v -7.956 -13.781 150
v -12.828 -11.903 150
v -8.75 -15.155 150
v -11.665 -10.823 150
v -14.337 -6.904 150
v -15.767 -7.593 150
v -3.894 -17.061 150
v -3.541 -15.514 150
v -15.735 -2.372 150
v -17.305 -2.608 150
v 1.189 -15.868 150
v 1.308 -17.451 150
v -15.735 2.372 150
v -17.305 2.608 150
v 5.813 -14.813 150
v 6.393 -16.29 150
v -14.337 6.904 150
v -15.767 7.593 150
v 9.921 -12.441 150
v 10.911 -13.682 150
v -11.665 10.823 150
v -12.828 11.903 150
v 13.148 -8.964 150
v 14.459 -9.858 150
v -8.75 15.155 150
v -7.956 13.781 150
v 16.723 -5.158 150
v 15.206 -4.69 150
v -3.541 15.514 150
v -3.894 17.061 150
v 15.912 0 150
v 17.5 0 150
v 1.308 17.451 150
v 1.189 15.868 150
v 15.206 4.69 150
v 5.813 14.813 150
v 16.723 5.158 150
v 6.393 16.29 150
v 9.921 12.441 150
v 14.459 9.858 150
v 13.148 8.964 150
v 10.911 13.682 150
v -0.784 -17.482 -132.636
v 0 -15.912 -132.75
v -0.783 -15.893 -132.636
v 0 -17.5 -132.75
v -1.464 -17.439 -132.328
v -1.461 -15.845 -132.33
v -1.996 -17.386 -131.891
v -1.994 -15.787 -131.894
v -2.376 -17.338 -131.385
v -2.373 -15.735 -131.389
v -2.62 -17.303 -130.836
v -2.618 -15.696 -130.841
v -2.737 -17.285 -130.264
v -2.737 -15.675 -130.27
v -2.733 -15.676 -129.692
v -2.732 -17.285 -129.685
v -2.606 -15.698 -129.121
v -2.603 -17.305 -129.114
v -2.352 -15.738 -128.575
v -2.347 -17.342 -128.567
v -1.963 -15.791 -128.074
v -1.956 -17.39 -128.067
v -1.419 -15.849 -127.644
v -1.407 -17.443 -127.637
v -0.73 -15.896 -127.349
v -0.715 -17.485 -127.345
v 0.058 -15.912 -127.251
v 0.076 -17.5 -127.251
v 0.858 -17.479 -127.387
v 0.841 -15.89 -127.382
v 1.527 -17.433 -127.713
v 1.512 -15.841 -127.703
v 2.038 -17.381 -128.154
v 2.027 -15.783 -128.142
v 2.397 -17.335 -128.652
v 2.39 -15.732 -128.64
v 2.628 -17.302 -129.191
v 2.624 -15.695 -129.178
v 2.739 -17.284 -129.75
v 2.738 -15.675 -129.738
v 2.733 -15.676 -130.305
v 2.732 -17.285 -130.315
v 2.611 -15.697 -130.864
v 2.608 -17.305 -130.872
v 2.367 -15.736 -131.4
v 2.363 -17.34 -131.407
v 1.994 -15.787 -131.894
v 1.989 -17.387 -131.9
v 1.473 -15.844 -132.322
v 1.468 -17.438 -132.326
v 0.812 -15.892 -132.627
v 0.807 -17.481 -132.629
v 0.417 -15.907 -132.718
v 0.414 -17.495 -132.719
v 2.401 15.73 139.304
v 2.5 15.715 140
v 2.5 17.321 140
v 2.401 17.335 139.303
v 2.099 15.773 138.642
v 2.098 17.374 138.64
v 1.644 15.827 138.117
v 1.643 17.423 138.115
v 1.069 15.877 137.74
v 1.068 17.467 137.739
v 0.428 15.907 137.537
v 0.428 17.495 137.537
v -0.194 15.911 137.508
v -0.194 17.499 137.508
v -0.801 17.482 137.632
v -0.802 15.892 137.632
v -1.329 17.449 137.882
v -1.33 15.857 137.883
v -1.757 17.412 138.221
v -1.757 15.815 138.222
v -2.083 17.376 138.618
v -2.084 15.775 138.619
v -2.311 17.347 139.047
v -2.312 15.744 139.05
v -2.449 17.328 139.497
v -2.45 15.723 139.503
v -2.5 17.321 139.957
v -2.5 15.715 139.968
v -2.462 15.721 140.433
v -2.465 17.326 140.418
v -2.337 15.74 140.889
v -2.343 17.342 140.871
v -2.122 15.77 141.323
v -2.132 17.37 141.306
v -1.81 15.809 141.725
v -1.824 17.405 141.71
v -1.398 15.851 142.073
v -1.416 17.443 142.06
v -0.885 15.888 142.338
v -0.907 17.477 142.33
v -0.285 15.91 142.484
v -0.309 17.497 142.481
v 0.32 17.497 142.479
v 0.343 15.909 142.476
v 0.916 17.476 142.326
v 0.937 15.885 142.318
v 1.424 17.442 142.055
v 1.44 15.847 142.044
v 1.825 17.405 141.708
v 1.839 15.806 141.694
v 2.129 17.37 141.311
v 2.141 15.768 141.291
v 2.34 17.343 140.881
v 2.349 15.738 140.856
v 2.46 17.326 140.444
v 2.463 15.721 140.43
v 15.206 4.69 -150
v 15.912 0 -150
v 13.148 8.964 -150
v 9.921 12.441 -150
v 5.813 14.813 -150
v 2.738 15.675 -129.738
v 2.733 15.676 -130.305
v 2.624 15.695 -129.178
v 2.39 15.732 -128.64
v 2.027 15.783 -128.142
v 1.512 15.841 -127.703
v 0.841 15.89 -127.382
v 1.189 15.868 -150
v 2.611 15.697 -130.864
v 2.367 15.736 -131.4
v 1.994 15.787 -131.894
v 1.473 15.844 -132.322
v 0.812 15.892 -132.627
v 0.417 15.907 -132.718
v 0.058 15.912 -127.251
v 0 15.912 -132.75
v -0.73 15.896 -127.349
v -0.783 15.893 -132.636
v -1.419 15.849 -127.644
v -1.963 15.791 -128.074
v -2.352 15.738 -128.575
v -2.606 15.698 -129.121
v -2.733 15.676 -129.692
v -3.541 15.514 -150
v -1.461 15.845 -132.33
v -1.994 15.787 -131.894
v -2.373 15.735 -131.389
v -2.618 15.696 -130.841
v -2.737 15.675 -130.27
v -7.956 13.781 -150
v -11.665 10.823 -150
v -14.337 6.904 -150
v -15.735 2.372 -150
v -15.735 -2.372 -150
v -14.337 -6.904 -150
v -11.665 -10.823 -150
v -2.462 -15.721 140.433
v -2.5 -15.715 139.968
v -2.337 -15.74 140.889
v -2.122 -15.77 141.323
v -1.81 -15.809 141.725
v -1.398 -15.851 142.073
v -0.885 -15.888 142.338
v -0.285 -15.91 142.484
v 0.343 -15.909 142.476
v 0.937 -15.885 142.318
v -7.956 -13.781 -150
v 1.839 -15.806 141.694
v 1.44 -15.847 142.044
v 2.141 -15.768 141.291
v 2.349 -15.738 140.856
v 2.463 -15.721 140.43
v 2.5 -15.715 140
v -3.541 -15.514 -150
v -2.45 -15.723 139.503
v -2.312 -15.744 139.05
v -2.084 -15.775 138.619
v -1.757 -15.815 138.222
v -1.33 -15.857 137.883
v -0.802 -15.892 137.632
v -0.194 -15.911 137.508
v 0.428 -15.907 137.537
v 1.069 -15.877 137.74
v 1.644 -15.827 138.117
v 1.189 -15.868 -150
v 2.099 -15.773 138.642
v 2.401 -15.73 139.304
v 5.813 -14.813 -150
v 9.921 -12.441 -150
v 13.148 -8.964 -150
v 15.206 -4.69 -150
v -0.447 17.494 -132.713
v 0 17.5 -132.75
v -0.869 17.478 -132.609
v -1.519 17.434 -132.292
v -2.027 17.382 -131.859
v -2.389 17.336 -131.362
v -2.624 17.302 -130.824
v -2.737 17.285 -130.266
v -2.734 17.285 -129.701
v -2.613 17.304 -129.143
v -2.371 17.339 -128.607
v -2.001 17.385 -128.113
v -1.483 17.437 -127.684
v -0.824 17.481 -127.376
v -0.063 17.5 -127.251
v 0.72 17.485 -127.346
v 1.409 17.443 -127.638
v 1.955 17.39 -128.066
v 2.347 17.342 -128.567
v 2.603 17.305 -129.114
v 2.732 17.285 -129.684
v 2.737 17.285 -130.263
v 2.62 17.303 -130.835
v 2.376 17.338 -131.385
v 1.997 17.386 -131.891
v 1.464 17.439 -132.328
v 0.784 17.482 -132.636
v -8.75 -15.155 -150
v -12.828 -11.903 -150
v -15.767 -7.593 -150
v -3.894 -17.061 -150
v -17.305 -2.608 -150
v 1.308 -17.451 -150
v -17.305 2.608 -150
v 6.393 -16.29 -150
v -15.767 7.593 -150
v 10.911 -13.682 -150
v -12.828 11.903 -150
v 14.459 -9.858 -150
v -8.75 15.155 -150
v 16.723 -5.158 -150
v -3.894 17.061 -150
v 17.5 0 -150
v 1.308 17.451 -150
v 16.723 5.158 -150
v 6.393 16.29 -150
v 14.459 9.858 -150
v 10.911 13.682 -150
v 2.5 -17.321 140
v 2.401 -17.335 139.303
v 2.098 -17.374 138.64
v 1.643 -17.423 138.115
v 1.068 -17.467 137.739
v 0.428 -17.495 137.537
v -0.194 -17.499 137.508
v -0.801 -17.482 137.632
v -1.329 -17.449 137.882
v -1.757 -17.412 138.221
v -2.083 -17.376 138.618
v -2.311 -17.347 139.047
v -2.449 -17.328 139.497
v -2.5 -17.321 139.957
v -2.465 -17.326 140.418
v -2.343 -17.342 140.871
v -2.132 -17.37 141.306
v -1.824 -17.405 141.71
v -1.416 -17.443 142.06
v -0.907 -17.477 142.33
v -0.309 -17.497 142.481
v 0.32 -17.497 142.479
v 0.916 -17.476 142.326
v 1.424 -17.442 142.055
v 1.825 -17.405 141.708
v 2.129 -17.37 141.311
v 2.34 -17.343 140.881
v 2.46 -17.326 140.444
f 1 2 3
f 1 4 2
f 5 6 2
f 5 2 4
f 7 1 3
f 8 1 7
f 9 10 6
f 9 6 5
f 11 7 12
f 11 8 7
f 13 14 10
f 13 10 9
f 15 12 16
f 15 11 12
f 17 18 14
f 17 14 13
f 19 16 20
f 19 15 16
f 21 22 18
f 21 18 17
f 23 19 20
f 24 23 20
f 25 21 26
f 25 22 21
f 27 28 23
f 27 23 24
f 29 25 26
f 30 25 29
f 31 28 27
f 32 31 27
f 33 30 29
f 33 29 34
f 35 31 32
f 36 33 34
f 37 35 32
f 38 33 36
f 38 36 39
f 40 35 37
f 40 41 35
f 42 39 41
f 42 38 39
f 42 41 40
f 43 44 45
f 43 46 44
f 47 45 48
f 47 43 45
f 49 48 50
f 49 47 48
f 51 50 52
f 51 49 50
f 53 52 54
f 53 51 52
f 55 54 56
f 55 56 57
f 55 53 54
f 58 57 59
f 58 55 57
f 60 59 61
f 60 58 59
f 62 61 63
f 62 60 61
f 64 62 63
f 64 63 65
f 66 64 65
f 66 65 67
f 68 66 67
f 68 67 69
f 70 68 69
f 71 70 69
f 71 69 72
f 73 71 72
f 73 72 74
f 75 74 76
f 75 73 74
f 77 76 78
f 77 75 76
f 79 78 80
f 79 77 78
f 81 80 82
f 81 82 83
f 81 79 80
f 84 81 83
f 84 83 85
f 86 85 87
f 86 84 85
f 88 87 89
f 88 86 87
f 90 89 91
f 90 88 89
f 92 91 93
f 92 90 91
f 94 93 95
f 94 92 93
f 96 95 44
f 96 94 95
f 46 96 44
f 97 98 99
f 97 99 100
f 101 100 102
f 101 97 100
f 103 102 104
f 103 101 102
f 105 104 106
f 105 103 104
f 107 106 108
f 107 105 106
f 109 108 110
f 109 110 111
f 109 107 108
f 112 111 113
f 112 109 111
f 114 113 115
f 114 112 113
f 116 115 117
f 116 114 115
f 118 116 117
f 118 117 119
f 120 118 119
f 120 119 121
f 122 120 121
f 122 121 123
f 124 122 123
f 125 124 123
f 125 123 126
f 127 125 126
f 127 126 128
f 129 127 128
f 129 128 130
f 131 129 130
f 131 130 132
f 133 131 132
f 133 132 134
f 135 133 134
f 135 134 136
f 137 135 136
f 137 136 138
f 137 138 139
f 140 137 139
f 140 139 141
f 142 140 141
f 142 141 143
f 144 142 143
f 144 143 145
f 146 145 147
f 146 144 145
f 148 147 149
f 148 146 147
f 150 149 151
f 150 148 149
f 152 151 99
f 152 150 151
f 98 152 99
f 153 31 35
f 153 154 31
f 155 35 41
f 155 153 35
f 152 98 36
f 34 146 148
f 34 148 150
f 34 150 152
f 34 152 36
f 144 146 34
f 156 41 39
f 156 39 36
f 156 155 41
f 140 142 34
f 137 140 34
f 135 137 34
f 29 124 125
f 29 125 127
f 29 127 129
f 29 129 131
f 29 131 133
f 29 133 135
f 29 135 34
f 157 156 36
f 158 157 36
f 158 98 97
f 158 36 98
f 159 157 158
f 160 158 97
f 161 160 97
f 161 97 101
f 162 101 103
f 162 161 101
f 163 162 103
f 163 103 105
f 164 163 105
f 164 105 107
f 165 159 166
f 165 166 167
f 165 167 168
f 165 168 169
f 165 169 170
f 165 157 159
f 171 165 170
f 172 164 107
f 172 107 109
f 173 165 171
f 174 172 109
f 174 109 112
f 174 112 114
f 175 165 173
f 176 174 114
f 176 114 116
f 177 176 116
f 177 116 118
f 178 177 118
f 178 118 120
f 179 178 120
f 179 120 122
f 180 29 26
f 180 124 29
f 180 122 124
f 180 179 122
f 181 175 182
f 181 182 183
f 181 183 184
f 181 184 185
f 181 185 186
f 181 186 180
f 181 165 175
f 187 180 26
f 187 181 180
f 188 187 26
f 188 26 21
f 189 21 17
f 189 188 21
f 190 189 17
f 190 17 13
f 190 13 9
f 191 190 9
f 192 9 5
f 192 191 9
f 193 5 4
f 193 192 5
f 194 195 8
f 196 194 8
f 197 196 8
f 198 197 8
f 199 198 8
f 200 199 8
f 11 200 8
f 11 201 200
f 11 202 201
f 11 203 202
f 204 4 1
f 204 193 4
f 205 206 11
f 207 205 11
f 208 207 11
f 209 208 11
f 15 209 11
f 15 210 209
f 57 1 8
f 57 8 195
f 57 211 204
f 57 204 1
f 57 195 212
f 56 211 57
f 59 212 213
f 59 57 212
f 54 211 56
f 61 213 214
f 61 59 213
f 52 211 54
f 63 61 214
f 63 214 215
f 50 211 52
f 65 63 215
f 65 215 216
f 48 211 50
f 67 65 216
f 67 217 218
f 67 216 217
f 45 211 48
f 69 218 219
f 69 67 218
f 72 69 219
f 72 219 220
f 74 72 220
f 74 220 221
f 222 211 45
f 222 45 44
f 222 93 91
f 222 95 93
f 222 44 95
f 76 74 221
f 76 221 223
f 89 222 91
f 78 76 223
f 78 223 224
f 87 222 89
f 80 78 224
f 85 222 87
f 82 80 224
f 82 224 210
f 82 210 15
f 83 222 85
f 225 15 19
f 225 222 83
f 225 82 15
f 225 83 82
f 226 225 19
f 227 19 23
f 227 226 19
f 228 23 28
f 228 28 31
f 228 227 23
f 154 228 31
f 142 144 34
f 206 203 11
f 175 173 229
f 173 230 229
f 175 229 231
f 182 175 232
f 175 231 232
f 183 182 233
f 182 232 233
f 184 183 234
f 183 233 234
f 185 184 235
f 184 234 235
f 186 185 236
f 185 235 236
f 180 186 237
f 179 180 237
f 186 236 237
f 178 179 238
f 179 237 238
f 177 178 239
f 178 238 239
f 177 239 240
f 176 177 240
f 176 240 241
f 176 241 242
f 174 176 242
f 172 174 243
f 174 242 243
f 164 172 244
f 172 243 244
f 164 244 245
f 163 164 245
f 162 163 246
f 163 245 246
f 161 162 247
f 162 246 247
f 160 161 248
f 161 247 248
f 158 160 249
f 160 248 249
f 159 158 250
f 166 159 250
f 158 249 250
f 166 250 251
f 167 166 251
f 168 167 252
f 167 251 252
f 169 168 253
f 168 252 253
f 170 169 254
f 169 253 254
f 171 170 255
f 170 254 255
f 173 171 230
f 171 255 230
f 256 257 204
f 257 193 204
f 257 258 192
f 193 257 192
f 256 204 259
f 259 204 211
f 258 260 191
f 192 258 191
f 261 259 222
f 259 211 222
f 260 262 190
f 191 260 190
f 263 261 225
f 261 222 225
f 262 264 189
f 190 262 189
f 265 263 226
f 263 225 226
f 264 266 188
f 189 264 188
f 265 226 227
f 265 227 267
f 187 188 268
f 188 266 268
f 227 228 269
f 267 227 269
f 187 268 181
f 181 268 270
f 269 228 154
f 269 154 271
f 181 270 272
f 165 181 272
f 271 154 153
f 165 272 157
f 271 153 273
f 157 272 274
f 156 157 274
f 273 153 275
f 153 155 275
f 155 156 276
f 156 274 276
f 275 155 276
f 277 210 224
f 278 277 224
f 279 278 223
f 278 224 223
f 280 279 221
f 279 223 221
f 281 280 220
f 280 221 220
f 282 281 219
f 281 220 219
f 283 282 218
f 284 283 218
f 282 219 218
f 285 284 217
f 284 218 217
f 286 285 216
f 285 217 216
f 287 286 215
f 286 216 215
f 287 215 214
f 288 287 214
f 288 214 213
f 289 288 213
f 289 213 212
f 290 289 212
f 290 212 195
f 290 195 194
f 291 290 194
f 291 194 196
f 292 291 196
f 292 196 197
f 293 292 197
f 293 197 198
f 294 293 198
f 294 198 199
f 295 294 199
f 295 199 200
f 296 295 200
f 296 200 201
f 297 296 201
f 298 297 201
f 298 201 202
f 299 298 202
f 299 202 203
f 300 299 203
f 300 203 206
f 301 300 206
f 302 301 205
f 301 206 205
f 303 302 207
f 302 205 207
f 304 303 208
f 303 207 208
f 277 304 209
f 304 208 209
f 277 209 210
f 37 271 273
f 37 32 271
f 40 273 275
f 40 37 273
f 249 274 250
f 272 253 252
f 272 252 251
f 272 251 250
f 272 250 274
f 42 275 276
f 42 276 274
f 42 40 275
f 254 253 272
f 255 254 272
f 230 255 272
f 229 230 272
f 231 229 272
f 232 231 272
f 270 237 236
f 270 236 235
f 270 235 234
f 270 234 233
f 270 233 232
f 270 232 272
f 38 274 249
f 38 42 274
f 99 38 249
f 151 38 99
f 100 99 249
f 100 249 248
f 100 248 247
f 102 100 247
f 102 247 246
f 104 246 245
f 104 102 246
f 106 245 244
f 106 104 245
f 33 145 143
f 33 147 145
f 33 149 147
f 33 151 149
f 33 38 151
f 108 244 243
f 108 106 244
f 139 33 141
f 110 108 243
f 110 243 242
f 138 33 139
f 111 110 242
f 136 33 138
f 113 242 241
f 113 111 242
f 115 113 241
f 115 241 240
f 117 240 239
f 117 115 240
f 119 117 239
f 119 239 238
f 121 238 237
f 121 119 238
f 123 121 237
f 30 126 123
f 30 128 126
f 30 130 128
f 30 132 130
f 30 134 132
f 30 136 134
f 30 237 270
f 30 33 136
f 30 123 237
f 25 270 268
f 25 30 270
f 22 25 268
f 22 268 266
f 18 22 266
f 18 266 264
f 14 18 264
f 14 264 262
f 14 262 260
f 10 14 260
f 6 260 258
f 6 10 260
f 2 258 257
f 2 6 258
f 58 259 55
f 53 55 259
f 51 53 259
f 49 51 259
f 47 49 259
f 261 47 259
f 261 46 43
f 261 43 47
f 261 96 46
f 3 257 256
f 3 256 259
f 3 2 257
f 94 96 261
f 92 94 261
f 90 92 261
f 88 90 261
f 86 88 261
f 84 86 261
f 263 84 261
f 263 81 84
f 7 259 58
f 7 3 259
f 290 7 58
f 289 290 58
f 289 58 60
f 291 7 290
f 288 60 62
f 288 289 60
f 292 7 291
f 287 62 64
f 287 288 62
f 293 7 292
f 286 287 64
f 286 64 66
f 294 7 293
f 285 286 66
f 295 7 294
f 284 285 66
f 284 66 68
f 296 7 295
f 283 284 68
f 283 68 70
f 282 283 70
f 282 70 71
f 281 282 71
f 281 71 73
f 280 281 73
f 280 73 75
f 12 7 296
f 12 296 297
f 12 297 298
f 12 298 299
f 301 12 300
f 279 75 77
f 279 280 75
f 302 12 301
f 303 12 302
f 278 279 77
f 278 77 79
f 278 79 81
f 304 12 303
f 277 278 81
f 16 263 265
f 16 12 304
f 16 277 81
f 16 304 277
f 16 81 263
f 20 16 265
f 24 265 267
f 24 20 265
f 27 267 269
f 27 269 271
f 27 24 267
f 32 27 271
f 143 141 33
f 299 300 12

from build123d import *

# Parameters (mm, degrees)
SKETCH1_R               = 17.5
SKETCH1_R_2             = 15.9125
BOSS_EXTRUDE1_DEPTH     = 150
SKETCH5_W               = 2.75
SKETCH5_H               = 17.5
SKETCH6_R               = 2.5
CUT_EXTRUDE1_DEPTH      = 18.5000001
CUT_EXTRUDE1_DEPTH_BACK = 18.5000001


with BuildPart() as part:
    # Sketch1 → Boss-Extrude1 (new body, symmetric)
    with BuildSketch(Plane.XY):
        Circle(SKETCH1_R)
        Circle(SKETCH1_R_2, mode=Mode.SUBTRACT)
    extrude(amount=BOSS_EXTRUDE1_DEPTH, both=True)

    # Sketch5 → M5 Clearance Hole1 (revolve, cut)
    with BuildSketch(Plane(origin=(0, 0, -130), x_dir=(0, 0, -1), z_dir=(1, 0, 0))):
        with Locations((1.375, 8.75)):
            Rectangle(SKETCH5_W, SKETCH5_H)
    m5_clearance_hole1 = revolve(axis=Axis((0, -6.35, -130), (0, 1, 0)), mode=Mode.SUBTRACT)

    # Mirror1: M5 Clearance Hole1 across plane
    add(m5_clearance_hole1.mirror(Plane.ZX), mode=Mode.SUBTRACT)

    # Sketch6 → Cut-Extrude1 (cut, two sides)
    with BuildSketch(Plane(origin=(0, 0, 0), x_dir=(1, 0, 0), z_dir=(0, 1, 0))) as cut_extrude1_sk:
        with Locations((0, -140)):
            Circle(SKETCH6_R)
    extrude(amount=CUT_EXTRUDE1_DEPTH, mode=Mode.SUBTRACT)
    extrude(cut_extrude1_sk.sketch, amount=-CUT_EXTRUDE1_DEPTH_BACK, mode=Mode.SUBTRACT)


solid = part.part
